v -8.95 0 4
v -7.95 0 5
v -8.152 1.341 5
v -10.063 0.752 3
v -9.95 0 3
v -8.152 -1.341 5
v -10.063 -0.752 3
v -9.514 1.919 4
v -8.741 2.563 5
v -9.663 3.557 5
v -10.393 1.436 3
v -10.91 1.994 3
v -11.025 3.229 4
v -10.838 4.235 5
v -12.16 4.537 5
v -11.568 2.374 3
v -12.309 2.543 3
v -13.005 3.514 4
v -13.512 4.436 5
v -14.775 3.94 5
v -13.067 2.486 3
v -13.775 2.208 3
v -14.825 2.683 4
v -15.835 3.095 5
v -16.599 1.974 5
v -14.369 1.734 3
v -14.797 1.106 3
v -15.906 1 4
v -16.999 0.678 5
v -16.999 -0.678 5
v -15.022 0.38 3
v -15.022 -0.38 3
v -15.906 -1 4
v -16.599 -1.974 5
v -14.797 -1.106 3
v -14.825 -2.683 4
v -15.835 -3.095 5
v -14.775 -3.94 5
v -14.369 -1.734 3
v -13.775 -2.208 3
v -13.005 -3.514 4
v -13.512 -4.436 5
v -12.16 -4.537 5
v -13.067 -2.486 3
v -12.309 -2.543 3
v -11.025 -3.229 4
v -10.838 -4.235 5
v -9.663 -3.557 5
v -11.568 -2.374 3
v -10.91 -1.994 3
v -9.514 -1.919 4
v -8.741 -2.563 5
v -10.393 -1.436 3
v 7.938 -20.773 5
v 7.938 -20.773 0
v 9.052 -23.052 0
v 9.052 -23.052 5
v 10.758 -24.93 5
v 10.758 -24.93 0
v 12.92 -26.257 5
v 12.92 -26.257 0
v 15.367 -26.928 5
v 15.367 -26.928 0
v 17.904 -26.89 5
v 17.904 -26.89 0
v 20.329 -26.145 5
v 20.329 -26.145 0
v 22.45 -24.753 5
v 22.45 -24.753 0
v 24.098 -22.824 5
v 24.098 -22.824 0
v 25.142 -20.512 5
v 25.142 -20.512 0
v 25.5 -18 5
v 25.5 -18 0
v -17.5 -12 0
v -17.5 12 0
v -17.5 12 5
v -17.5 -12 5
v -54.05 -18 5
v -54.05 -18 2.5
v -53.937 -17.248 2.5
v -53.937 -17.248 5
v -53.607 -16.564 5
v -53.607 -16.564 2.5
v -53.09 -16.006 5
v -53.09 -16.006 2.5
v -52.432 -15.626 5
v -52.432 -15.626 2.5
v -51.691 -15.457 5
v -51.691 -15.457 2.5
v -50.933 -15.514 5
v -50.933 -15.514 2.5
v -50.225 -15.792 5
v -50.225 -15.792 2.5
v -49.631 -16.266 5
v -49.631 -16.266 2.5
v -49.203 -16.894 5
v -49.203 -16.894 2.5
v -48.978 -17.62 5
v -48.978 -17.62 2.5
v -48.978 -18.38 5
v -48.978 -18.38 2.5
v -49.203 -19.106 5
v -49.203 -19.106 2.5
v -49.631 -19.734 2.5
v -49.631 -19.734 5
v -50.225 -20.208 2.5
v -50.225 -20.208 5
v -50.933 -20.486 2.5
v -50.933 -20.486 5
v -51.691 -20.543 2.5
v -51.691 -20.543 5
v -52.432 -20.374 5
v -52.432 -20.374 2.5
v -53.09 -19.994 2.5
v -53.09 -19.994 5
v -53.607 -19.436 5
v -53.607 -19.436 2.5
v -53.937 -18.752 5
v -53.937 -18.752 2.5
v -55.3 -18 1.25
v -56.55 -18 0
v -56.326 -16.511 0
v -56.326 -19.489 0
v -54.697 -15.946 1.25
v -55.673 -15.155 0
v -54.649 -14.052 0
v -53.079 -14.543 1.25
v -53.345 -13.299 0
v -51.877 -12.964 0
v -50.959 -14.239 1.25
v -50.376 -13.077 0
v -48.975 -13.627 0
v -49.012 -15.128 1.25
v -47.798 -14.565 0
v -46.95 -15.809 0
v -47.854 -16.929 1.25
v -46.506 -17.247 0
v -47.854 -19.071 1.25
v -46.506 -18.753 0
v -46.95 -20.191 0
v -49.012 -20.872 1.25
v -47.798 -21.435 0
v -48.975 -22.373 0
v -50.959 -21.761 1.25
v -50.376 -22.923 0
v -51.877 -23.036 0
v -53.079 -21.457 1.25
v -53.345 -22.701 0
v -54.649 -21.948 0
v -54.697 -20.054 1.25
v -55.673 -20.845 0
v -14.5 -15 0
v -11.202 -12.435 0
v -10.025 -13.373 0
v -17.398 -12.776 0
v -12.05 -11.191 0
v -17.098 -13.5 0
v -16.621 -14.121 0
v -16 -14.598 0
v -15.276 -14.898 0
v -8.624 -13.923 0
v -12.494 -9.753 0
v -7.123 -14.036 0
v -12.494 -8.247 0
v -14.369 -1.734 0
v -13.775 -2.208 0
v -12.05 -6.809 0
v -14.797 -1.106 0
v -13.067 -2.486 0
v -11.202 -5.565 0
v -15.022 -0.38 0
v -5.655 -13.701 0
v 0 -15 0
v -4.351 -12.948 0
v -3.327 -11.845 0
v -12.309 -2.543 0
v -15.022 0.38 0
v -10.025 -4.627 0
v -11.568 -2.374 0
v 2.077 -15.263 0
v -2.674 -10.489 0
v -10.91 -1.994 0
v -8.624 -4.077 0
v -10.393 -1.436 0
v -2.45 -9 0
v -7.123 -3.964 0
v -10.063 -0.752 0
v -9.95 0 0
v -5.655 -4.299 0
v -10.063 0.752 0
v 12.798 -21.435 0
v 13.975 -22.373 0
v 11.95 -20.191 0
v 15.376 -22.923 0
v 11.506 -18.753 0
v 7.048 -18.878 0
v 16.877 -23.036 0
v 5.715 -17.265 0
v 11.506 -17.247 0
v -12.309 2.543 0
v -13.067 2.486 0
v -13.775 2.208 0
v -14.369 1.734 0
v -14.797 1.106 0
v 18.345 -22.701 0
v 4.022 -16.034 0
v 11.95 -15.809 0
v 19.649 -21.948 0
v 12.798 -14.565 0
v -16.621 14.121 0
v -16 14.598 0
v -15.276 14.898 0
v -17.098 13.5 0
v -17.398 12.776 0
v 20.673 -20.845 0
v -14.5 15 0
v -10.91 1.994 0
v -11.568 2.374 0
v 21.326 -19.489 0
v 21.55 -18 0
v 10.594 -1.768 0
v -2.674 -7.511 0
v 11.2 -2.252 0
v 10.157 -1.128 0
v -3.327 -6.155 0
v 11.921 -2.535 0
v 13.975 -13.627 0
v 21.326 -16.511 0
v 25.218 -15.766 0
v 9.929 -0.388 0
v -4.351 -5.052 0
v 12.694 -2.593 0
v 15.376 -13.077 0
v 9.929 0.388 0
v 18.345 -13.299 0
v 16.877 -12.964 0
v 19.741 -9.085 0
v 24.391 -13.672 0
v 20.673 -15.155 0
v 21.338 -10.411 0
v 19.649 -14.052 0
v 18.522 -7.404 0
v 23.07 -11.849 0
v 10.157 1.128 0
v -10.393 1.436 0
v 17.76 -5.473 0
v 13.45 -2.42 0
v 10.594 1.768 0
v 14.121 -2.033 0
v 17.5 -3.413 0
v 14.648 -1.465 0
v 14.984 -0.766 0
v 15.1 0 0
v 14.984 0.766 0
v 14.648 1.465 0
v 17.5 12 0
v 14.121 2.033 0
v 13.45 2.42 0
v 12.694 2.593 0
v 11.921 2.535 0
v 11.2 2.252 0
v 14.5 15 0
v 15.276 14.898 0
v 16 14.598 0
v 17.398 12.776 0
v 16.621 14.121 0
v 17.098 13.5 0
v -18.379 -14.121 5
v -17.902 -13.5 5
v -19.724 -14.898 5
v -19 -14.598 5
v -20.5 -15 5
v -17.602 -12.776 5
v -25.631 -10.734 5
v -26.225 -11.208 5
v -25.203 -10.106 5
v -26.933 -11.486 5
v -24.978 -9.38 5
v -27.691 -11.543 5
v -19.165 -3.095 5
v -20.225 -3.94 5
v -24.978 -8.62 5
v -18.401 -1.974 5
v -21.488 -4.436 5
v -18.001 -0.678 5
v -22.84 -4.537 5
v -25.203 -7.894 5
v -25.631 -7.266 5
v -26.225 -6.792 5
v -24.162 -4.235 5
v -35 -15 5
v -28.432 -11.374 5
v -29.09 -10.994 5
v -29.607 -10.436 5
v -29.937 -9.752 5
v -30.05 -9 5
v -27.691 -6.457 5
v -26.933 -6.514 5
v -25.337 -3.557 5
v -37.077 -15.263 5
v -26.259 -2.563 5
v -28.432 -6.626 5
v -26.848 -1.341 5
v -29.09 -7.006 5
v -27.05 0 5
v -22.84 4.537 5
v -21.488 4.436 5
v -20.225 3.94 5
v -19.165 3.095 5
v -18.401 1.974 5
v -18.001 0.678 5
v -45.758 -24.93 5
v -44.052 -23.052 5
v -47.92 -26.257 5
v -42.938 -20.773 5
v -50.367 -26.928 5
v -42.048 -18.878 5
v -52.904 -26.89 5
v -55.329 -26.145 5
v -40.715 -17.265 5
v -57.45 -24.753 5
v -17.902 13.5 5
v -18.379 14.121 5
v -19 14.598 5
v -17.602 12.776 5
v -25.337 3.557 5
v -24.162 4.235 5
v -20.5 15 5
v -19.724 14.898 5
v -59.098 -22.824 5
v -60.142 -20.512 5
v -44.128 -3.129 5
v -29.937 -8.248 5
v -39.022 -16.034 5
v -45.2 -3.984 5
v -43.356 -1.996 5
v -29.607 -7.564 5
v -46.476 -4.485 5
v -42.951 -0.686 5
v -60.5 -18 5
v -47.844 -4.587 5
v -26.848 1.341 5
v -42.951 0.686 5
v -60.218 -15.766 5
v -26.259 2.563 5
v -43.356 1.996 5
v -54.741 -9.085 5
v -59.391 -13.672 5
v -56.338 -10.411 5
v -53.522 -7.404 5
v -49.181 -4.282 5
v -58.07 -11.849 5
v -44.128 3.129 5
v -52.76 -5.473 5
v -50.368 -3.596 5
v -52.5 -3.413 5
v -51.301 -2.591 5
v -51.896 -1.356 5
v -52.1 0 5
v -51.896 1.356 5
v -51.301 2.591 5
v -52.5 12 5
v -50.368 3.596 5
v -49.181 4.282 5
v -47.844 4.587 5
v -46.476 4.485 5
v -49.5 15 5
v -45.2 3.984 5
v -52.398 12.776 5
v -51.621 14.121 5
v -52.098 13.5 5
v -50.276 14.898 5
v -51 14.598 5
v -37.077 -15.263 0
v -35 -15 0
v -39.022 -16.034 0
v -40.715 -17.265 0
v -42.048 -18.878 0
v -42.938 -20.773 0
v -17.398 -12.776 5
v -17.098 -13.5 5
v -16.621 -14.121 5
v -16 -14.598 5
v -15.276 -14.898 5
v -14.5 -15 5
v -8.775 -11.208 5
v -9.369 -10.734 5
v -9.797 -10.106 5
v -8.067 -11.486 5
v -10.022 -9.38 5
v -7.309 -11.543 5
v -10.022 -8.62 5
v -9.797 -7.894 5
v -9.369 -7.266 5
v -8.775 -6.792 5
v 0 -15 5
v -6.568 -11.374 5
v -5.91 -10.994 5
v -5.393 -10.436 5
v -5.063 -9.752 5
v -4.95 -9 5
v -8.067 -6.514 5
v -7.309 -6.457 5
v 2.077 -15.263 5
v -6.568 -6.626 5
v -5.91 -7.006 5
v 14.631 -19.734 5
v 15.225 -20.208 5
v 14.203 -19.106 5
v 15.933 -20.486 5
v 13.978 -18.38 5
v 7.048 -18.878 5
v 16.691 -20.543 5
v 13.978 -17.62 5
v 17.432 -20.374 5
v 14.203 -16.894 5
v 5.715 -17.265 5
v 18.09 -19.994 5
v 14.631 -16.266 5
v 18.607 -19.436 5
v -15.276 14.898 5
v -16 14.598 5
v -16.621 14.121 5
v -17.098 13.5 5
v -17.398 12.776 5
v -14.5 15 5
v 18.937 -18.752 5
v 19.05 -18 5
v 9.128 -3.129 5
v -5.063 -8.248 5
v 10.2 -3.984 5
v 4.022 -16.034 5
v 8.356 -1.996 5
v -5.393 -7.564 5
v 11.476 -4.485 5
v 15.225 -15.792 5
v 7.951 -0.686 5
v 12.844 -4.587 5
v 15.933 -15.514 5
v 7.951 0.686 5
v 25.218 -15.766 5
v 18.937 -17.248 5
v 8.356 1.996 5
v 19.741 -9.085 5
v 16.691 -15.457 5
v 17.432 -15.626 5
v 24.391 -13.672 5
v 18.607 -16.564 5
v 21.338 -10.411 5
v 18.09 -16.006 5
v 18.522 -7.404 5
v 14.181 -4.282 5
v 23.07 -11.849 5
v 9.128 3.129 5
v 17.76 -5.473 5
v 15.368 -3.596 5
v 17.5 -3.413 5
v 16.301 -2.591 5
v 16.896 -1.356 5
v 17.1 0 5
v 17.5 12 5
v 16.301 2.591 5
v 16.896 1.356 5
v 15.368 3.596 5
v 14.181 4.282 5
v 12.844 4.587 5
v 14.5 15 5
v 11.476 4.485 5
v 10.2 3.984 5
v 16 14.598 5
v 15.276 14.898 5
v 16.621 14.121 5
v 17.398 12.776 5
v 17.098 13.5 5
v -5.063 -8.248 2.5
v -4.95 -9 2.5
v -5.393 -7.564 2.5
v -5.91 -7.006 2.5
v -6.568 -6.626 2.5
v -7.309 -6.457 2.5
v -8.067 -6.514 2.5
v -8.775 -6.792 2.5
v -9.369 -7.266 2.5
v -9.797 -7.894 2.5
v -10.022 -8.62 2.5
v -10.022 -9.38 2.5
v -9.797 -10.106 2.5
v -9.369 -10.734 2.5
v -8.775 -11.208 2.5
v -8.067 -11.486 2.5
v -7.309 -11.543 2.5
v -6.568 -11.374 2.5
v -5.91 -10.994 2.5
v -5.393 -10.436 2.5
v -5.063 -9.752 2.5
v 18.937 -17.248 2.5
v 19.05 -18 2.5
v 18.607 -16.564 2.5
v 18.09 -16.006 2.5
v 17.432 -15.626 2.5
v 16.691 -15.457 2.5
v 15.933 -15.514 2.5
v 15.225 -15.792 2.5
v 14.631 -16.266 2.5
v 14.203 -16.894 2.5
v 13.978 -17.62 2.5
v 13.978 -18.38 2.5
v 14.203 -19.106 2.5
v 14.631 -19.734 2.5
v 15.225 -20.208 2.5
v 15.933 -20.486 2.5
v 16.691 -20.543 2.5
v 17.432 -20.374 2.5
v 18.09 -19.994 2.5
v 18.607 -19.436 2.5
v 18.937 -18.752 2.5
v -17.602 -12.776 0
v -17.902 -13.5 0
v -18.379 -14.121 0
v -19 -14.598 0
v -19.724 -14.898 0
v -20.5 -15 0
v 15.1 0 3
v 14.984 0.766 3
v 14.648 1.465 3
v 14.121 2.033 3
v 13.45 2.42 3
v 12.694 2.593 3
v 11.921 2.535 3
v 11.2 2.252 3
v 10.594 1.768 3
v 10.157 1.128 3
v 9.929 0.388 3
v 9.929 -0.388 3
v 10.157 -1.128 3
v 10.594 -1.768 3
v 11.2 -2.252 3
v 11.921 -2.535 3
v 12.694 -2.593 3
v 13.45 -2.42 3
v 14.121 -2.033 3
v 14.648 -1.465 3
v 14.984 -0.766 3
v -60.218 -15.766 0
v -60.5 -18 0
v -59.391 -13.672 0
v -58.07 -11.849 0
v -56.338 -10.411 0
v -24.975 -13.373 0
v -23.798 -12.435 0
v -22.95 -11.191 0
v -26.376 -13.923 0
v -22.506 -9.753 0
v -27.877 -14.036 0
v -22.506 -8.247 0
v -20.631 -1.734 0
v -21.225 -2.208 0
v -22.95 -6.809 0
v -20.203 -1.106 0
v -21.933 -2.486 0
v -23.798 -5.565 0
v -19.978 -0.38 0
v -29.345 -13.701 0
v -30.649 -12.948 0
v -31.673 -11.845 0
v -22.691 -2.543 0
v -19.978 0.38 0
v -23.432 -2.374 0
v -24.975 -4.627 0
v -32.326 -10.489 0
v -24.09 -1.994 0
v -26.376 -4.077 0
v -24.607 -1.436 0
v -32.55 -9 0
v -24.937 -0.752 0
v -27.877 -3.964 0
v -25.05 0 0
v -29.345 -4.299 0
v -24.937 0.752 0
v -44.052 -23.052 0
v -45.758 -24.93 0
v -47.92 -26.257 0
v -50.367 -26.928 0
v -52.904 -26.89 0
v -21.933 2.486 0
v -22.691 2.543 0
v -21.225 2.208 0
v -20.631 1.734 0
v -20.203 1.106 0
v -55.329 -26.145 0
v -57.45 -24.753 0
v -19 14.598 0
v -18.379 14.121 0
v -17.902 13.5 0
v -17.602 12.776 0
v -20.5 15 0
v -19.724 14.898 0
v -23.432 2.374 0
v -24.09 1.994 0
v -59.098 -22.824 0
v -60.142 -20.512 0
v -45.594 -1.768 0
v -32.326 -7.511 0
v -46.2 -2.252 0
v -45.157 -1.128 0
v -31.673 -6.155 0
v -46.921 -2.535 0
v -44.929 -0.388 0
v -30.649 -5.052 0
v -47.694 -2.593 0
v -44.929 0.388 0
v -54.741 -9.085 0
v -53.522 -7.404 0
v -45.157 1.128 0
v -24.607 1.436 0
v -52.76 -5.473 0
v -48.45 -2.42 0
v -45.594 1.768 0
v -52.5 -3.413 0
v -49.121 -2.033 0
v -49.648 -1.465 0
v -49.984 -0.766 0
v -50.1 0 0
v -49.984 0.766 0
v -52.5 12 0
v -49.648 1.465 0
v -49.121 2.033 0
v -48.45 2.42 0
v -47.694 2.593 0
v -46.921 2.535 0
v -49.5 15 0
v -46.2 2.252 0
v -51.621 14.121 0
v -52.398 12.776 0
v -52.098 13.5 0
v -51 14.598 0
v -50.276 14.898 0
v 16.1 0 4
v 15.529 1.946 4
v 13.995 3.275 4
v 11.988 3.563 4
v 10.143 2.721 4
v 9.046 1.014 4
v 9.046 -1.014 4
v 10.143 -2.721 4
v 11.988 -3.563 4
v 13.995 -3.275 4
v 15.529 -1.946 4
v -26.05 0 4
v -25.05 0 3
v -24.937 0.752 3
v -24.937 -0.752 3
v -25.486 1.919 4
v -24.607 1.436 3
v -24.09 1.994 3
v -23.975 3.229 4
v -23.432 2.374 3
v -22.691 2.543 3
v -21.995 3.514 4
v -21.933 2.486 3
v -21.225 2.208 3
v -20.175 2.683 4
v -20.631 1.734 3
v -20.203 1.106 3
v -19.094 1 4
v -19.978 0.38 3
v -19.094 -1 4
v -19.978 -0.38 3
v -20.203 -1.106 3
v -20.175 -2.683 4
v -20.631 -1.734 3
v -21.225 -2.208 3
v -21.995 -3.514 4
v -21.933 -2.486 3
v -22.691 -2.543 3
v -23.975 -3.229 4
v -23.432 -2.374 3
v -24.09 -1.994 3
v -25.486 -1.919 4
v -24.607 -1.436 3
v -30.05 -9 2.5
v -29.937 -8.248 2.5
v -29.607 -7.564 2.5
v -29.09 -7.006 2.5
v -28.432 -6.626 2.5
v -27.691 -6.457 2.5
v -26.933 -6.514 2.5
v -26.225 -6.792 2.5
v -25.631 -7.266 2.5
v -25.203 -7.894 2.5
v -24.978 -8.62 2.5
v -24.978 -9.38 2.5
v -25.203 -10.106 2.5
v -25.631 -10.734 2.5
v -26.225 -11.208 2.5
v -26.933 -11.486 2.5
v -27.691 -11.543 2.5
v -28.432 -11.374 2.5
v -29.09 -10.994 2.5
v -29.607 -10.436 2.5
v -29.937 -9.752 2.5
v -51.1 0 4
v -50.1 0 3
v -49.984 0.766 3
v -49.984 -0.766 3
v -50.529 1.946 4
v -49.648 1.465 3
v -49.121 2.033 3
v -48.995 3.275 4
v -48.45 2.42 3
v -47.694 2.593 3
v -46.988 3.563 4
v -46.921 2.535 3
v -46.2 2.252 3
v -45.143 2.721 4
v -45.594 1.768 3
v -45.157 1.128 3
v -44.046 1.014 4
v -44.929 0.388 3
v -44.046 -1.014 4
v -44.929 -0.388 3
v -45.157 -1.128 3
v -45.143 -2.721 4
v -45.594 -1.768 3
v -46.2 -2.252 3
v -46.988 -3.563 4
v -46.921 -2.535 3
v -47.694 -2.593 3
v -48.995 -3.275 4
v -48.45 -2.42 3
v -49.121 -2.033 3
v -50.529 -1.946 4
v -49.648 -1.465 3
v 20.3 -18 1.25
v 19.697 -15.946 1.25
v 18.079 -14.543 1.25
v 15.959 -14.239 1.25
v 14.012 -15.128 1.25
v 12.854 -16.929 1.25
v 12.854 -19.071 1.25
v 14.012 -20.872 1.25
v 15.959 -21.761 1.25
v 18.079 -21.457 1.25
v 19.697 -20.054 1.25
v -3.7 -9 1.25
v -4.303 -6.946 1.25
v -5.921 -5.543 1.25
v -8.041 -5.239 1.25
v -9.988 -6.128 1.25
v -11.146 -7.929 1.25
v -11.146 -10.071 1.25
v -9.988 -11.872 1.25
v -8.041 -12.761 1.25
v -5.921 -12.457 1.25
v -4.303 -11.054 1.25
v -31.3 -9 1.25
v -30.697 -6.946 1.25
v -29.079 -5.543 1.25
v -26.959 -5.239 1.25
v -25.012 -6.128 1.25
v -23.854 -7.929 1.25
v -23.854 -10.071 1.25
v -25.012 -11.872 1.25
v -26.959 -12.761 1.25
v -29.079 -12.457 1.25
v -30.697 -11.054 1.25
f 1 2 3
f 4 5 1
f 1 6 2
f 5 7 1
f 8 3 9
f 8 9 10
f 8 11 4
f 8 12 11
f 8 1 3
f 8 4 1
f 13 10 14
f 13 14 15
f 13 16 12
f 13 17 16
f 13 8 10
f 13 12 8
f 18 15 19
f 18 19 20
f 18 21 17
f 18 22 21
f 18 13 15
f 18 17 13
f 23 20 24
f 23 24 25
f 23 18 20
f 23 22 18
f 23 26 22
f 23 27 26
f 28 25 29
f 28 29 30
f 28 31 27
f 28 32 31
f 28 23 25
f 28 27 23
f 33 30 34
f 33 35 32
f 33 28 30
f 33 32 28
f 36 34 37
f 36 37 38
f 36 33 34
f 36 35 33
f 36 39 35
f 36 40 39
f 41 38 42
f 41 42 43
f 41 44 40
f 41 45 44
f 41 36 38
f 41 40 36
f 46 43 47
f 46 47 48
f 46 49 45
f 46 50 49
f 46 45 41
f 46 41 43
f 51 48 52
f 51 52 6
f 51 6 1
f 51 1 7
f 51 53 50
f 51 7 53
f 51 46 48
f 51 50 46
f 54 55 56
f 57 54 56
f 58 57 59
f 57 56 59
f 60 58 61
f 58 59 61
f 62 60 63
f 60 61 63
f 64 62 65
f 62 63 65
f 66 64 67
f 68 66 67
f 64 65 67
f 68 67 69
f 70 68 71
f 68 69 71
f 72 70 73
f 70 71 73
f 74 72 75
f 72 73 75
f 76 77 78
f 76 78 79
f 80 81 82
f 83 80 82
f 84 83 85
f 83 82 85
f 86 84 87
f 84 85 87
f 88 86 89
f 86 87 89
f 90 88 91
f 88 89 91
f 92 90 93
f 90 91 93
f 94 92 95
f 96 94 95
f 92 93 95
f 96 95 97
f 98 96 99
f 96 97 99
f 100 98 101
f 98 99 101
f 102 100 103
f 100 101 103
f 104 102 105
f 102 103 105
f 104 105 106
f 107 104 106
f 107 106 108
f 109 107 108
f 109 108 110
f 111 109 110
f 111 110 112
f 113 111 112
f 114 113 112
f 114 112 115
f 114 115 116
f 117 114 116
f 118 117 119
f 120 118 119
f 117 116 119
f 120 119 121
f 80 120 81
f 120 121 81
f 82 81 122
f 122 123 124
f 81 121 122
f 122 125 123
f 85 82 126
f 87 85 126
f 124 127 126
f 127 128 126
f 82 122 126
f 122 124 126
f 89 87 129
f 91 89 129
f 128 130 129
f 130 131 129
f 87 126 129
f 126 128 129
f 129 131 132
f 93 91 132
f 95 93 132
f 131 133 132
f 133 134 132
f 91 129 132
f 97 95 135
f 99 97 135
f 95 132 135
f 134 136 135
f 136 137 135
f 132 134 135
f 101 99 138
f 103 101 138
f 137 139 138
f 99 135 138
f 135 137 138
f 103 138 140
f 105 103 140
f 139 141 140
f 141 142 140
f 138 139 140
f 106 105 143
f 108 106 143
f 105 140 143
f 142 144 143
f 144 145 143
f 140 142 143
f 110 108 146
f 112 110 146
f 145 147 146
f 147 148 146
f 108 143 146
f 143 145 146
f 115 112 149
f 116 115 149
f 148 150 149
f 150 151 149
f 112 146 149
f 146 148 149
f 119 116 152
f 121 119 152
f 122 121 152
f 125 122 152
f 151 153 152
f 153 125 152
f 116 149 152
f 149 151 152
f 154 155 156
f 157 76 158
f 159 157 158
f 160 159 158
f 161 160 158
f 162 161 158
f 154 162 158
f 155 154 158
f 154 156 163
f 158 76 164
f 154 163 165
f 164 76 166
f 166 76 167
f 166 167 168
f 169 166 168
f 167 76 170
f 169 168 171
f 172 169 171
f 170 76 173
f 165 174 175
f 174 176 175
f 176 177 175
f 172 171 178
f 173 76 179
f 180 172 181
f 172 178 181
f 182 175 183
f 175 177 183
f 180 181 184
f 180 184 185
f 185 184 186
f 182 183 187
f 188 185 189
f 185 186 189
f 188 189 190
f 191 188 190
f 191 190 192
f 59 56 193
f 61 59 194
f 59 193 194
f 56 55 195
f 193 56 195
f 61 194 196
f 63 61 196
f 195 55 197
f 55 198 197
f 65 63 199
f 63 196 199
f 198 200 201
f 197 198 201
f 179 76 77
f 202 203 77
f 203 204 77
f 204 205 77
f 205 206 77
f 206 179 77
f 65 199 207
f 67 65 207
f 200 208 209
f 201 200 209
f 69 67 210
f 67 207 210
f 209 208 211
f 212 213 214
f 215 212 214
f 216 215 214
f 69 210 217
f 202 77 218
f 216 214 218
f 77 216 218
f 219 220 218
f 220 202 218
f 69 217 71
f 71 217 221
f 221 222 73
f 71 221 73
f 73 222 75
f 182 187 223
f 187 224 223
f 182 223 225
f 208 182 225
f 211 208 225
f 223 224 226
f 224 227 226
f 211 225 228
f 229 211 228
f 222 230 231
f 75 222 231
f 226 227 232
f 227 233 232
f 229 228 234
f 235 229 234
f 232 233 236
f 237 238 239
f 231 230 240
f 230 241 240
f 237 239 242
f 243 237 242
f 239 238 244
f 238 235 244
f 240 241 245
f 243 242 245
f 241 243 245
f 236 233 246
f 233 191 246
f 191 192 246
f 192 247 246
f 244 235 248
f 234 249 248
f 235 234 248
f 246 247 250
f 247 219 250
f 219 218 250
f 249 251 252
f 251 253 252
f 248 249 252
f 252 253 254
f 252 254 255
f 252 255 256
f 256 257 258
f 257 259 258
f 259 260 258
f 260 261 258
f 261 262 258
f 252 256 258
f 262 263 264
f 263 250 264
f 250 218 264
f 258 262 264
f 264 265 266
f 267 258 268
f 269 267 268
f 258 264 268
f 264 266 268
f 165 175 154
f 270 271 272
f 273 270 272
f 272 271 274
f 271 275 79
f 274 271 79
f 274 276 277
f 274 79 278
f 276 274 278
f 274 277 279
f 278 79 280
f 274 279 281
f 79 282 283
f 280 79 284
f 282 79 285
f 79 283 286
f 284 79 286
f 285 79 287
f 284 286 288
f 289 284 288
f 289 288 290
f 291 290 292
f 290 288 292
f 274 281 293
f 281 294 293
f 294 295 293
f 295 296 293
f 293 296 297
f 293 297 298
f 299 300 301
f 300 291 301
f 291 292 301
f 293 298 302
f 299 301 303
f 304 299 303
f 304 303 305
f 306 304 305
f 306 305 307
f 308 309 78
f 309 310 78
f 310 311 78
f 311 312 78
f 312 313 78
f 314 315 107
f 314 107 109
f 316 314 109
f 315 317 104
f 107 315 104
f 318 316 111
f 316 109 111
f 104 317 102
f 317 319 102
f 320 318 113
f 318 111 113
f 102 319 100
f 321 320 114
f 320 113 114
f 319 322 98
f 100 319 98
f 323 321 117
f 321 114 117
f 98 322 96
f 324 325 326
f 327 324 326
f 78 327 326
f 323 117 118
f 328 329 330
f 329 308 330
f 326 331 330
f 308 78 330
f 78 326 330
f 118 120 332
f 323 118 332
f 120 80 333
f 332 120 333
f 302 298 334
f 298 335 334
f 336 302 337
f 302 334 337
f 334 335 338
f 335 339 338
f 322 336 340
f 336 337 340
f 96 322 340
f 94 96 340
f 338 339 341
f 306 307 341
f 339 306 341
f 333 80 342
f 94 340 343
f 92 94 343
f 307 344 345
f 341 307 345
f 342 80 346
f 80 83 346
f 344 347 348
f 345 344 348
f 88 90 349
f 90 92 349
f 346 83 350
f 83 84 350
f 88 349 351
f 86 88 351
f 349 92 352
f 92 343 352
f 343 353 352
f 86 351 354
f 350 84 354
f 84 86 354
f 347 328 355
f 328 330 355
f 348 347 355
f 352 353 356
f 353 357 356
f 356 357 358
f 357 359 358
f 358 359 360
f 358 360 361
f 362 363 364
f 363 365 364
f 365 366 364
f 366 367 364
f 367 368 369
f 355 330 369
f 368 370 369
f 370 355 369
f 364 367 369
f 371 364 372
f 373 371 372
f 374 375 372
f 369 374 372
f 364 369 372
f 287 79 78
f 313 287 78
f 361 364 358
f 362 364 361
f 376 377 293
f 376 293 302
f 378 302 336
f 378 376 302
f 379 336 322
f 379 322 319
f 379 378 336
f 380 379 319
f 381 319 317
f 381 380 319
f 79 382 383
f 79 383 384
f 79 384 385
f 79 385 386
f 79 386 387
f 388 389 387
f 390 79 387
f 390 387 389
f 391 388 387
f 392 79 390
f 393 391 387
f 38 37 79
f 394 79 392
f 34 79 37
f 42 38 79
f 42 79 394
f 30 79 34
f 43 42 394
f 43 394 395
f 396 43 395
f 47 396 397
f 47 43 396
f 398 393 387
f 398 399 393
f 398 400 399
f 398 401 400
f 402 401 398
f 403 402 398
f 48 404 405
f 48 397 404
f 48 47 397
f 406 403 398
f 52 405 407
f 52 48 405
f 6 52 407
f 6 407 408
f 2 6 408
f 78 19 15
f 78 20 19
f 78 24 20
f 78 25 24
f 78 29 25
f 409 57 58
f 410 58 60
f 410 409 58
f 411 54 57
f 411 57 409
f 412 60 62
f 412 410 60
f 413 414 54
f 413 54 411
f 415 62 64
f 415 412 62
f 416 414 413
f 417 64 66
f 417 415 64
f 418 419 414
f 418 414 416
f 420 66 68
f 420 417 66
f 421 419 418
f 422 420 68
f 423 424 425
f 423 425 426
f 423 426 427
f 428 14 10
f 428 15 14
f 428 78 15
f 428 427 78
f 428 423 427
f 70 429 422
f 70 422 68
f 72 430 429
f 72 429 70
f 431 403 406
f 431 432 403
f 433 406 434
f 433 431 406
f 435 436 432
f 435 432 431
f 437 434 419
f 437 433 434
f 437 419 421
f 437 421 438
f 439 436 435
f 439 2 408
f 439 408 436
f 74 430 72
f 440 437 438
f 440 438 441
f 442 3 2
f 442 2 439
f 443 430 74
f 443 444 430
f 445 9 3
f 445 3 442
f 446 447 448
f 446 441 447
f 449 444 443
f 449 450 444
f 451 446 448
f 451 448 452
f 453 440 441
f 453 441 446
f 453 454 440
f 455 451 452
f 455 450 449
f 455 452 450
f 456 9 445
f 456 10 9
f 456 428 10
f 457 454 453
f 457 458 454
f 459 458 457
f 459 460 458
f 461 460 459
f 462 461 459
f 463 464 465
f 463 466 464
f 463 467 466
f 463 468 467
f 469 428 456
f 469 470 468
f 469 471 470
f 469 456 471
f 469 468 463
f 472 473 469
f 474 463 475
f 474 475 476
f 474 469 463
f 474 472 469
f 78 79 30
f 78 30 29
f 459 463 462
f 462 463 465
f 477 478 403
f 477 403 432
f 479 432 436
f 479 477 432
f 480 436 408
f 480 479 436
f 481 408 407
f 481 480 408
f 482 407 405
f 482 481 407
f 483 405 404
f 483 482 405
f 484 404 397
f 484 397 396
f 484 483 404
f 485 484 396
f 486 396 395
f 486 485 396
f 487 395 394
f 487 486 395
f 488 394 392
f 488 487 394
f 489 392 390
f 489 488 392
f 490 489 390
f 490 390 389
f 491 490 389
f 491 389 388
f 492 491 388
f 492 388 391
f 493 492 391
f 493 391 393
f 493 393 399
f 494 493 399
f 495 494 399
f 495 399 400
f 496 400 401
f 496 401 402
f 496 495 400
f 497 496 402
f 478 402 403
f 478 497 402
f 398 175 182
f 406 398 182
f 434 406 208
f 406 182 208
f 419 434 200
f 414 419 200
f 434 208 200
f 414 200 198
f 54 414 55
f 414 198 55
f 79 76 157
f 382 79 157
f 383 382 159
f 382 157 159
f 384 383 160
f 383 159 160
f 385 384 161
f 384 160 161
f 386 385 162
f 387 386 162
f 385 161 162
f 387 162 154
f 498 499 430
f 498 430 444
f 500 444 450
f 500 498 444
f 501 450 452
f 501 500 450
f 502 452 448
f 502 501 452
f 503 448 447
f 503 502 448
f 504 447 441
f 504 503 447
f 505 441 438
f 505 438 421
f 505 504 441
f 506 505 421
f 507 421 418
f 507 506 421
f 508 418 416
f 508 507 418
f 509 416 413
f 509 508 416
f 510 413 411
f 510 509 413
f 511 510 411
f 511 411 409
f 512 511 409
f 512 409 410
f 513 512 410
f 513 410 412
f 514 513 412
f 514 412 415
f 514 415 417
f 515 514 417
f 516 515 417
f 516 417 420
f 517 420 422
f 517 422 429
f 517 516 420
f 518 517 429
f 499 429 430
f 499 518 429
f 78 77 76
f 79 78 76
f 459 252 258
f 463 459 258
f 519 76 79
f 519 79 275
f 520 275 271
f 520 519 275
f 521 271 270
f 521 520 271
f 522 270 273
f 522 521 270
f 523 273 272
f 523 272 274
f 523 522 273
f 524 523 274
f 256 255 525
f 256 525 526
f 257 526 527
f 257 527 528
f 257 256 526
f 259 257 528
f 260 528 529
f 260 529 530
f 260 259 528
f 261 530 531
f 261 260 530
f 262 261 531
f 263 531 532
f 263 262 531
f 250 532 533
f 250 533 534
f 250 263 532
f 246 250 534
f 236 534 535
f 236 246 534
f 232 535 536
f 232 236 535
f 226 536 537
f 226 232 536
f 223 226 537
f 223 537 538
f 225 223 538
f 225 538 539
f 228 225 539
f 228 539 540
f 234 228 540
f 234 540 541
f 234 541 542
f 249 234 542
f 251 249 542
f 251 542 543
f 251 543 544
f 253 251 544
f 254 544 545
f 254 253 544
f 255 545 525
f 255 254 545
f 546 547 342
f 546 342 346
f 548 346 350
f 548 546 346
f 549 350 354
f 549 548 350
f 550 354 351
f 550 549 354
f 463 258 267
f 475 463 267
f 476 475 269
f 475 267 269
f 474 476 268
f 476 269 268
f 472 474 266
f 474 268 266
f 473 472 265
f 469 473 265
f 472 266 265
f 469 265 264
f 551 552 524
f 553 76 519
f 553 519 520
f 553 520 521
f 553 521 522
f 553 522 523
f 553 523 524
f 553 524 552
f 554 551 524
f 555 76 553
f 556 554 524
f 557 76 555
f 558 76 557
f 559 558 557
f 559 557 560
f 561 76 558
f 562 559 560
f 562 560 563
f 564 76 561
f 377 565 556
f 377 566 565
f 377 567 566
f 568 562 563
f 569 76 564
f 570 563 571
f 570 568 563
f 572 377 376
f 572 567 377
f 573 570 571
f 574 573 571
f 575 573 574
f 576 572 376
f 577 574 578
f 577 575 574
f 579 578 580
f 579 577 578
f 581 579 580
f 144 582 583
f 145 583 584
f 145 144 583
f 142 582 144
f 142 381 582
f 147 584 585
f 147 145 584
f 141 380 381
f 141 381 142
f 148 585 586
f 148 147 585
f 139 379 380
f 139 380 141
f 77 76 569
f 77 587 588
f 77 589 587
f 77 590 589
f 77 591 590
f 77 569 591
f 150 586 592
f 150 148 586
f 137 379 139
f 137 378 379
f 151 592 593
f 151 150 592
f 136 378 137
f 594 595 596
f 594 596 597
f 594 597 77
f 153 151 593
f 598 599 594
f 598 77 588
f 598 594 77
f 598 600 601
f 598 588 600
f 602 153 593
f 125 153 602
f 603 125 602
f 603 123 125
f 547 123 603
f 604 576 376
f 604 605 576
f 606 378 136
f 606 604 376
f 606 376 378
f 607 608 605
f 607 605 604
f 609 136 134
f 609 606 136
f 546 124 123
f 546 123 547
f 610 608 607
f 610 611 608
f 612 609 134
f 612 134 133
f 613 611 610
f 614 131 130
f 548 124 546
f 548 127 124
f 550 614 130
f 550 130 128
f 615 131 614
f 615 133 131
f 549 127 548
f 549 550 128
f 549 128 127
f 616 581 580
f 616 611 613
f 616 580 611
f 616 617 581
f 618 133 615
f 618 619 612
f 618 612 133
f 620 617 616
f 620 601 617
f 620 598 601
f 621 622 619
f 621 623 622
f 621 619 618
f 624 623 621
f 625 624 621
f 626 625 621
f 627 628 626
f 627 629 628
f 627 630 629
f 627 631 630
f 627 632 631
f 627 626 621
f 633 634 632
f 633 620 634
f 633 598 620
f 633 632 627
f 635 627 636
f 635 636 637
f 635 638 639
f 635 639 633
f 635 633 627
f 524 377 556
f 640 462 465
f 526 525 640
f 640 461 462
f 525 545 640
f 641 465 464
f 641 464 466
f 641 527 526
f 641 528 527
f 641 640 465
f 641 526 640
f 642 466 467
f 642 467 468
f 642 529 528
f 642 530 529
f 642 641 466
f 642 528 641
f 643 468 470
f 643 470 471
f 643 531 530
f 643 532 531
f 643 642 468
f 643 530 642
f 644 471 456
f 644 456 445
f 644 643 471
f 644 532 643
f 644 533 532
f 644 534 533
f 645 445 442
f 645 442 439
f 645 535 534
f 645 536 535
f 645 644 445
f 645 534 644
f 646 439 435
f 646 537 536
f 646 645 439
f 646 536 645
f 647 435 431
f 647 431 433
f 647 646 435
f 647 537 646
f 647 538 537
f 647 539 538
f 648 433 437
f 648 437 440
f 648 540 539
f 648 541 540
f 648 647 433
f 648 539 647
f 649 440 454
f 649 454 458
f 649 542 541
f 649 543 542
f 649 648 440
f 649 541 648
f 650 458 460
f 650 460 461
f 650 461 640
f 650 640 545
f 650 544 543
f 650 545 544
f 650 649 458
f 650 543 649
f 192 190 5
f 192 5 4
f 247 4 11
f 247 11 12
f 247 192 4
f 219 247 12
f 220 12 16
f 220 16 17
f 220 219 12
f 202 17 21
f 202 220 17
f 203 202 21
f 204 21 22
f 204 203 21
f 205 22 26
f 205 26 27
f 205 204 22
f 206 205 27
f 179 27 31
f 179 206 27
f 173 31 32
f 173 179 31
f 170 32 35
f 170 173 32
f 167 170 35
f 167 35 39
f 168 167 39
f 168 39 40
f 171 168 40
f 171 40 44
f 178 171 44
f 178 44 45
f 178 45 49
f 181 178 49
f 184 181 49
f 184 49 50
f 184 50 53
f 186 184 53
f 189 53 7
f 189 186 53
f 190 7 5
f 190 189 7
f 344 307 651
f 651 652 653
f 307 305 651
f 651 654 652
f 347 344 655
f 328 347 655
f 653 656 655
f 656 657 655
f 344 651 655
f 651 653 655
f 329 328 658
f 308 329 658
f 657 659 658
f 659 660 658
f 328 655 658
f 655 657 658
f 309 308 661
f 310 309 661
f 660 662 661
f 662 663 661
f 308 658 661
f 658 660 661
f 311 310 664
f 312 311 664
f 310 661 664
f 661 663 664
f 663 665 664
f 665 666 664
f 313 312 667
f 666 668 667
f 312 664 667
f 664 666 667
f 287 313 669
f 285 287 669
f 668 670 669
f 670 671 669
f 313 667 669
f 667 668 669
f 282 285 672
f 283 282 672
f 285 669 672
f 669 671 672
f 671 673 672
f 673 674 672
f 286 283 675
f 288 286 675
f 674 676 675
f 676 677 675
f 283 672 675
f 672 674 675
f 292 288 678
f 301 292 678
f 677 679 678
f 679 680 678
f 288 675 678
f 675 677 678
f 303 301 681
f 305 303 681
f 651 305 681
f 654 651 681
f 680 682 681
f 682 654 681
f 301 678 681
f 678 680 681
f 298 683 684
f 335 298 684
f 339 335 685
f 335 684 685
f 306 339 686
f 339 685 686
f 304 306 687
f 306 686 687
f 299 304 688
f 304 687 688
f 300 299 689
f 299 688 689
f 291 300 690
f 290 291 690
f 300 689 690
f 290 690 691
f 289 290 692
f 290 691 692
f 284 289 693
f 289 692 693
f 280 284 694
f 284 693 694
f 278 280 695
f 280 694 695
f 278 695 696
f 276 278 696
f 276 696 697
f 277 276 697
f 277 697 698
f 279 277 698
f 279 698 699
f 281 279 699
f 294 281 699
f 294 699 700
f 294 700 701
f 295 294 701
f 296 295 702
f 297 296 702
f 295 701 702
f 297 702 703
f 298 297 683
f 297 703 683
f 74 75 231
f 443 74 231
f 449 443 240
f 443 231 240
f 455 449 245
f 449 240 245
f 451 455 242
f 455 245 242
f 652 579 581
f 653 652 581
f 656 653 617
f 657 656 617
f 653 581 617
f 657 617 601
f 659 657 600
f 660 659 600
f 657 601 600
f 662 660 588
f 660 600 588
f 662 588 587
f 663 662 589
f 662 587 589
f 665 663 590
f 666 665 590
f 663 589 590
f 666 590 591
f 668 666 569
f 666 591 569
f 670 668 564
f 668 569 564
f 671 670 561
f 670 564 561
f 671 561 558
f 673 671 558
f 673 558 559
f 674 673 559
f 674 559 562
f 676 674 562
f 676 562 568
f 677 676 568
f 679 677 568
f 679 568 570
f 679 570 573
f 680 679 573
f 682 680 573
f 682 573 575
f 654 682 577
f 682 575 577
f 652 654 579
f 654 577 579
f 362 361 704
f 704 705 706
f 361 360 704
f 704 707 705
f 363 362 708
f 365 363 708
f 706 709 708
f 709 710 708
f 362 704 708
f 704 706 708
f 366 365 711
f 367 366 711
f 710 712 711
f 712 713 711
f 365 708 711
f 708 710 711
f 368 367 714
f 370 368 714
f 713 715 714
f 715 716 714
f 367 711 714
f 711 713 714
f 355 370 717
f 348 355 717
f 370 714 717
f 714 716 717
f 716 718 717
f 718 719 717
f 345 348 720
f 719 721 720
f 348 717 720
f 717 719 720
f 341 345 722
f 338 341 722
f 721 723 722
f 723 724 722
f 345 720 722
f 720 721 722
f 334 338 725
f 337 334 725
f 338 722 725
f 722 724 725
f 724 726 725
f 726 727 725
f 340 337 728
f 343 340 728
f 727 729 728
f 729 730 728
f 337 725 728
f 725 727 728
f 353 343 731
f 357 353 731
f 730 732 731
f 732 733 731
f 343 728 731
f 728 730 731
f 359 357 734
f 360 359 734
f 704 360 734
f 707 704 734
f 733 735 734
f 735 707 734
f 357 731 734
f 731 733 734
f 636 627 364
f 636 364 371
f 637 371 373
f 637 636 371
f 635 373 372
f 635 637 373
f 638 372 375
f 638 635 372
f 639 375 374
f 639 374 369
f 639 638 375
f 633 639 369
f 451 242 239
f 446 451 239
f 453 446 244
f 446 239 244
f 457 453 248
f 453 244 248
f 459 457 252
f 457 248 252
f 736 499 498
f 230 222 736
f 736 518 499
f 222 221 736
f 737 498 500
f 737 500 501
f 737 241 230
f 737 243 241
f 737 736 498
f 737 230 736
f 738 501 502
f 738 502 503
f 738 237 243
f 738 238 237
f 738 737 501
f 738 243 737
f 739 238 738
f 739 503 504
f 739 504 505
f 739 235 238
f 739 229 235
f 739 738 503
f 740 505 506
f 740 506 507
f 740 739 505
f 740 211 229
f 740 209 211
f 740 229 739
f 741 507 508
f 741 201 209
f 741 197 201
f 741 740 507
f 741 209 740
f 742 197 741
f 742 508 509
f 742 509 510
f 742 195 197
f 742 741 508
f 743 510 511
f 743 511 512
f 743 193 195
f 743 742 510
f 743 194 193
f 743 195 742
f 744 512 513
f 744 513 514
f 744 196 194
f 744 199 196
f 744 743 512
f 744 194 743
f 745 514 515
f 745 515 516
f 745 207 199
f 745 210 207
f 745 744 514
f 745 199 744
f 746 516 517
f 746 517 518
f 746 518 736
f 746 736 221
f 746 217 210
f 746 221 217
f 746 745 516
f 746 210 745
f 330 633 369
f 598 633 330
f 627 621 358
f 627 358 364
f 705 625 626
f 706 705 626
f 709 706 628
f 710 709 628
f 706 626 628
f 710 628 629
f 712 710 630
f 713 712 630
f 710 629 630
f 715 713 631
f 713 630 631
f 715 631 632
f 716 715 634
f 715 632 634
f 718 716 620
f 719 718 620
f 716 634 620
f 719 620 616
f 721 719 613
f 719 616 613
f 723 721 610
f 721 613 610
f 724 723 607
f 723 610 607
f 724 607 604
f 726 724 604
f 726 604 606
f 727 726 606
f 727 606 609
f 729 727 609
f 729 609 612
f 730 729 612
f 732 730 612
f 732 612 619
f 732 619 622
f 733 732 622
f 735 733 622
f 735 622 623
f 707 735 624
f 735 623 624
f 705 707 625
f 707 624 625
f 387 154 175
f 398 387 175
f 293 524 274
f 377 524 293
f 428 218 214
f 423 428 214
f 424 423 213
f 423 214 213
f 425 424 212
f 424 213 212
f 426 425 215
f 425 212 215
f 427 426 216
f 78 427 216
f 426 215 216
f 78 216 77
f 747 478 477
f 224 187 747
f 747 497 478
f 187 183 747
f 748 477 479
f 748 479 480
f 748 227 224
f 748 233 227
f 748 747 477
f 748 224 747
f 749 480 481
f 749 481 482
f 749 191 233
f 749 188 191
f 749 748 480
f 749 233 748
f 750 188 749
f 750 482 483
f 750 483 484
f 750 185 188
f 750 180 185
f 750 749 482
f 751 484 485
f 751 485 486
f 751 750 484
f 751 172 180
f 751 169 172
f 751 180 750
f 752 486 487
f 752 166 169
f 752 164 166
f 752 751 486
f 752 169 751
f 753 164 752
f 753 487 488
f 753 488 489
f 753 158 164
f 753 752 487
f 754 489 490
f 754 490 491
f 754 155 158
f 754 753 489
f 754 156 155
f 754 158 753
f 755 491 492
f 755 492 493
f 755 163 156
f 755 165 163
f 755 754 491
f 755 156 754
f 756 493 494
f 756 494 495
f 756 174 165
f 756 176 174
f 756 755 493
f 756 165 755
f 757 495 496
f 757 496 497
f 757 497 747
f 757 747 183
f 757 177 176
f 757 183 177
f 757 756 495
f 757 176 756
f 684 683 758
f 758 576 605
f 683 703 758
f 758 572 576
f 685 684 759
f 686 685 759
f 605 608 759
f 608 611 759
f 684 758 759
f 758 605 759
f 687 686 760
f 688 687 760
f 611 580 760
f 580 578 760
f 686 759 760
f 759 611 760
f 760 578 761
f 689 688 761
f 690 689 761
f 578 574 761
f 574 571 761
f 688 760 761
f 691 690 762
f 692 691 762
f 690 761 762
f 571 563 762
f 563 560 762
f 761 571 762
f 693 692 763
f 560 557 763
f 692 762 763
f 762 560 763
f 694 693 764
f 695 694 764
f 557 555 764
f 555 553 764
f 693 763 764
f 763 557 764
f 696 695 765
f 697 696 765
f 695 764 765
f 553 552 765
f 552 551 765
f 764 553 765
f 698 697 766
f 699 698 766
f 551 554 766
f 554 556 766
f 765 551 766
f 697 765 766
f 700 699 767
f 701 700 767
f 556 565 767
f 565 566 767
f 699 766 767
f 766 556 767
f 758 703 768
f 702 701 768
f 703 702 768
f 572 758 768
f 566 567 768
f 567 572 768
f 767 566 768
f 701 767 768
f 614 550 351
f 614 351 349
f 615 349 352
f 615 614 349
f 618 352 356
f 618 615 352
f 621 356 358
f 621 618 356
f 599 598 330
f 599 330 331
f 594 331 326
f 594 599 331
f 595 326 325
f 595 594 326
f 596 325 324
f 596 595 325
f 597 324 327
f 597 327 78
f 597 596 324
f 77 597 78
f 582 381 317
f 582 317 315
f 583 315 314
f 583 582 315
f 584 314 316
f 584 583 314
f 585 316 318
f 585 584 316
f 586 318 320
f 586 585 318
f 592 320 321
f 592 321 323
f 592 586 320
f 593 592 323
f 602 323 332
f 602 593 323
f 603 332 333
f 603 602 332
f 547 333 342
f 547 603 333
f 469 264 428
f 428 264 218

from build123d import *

# Parameters (mm, degrees)
F0_R     = 2.55
F0_R_2   = 2.6
F1_DEPTH = 5
F2_SIZE  = 2.5
F3_SIZE  = 2
F4_SIZE  = 2.5


with BuildPart() as f1:
    # F0 (on Top) → F1 (new body)
    with BuildSketch(Plane.XY):
        with BuildLine():
            Line((-17.5, 12), (-17.5, -12))
            ThreePointArc((-17.5, -12), (-16.62132, -14.12132), (-14.5, -15))
            Line((-14.5, -15), (0, -15))
            ThreePointArc((0, -15), (4.907558, -16.595858), (7.937838, -20.772973))
            ThreePointArc((7.937838, -20.772973), (10.994497, -10.880348), (21.33794, -10.410907))
            ThreePointArc((21.33794, -10.410907), (18.52247, -7.403524), (17.5, -3.412814))
            Line((17.5, -3.412814), (17.5, 12))
            ThreePointArc((17.5, 12), (16.62132, 14.12132), (14.5, 15))
            Line((14.5, 15), (-14.5, 15))
            ThreePointArc((-14.5, 15), (-16.62132, 14.12132), (-17.5, 12))
        make_face()
        with Locations((-7.5, -9)):
            Circle(F0_R, mode=Mode.SUBTRACT)
        with Locations((-12.5, 0)):
            Circle(F0_R, mode=Mode.SUBTRACT)
        with Locations((12.5, 0)):
            Circle(F0_R_2, mode=Mode.SUBTRACT)
        with BuildLine():
            ThreePointArc((21.33794, -10.410907), (10.994497, -10.880348), (7.937838, -20.772973))
            ThreePointArc((7.937838, -20.772973), (17.903663, -26.889867), (25.5, -18))
            ThreePointArc((25.5, -18), (24.39118, -13.672267), (21.33794, -10.410907))
        make_face()
        with Locations((16.5, -18)):
            Circle(F0_R, mode=Mode.SUBTRACT)
    extrude(amount=F1_DEPTH)

    # F2
    f2_edges = [f1.edges().sort_by_distance(p)[0] for p in [
        (-10.05, -9, 0),
    ]]
    chamfer(f2_edges, length=F2_SIZE)

    # F3
    f3_edges = [f1.edges().sort_by_distance(p)[0] for p in [
        (9.9, 0, 5),
        (-15.05, 0, 5),
    ]]
    chamfer(f3_edges, length=F3_SIZE)

    # F4
    f4_edges = [f1.edges().sort_by_distance(p)[0] for p in [
        (13.95, -18, 0),
    ]]
    chamfer(f4_edges, length=F4_SIZE)


with BuildPart() as f5_1:
    # F5: instance of F1
    add(f1.part.mirror(Plane(origin=(-17.5, 0, 2.5), x_dir=(0, -1, 0), z_dir=(-1, 0, 0))))


solid = Compound([f1.part, f5_1.part])
